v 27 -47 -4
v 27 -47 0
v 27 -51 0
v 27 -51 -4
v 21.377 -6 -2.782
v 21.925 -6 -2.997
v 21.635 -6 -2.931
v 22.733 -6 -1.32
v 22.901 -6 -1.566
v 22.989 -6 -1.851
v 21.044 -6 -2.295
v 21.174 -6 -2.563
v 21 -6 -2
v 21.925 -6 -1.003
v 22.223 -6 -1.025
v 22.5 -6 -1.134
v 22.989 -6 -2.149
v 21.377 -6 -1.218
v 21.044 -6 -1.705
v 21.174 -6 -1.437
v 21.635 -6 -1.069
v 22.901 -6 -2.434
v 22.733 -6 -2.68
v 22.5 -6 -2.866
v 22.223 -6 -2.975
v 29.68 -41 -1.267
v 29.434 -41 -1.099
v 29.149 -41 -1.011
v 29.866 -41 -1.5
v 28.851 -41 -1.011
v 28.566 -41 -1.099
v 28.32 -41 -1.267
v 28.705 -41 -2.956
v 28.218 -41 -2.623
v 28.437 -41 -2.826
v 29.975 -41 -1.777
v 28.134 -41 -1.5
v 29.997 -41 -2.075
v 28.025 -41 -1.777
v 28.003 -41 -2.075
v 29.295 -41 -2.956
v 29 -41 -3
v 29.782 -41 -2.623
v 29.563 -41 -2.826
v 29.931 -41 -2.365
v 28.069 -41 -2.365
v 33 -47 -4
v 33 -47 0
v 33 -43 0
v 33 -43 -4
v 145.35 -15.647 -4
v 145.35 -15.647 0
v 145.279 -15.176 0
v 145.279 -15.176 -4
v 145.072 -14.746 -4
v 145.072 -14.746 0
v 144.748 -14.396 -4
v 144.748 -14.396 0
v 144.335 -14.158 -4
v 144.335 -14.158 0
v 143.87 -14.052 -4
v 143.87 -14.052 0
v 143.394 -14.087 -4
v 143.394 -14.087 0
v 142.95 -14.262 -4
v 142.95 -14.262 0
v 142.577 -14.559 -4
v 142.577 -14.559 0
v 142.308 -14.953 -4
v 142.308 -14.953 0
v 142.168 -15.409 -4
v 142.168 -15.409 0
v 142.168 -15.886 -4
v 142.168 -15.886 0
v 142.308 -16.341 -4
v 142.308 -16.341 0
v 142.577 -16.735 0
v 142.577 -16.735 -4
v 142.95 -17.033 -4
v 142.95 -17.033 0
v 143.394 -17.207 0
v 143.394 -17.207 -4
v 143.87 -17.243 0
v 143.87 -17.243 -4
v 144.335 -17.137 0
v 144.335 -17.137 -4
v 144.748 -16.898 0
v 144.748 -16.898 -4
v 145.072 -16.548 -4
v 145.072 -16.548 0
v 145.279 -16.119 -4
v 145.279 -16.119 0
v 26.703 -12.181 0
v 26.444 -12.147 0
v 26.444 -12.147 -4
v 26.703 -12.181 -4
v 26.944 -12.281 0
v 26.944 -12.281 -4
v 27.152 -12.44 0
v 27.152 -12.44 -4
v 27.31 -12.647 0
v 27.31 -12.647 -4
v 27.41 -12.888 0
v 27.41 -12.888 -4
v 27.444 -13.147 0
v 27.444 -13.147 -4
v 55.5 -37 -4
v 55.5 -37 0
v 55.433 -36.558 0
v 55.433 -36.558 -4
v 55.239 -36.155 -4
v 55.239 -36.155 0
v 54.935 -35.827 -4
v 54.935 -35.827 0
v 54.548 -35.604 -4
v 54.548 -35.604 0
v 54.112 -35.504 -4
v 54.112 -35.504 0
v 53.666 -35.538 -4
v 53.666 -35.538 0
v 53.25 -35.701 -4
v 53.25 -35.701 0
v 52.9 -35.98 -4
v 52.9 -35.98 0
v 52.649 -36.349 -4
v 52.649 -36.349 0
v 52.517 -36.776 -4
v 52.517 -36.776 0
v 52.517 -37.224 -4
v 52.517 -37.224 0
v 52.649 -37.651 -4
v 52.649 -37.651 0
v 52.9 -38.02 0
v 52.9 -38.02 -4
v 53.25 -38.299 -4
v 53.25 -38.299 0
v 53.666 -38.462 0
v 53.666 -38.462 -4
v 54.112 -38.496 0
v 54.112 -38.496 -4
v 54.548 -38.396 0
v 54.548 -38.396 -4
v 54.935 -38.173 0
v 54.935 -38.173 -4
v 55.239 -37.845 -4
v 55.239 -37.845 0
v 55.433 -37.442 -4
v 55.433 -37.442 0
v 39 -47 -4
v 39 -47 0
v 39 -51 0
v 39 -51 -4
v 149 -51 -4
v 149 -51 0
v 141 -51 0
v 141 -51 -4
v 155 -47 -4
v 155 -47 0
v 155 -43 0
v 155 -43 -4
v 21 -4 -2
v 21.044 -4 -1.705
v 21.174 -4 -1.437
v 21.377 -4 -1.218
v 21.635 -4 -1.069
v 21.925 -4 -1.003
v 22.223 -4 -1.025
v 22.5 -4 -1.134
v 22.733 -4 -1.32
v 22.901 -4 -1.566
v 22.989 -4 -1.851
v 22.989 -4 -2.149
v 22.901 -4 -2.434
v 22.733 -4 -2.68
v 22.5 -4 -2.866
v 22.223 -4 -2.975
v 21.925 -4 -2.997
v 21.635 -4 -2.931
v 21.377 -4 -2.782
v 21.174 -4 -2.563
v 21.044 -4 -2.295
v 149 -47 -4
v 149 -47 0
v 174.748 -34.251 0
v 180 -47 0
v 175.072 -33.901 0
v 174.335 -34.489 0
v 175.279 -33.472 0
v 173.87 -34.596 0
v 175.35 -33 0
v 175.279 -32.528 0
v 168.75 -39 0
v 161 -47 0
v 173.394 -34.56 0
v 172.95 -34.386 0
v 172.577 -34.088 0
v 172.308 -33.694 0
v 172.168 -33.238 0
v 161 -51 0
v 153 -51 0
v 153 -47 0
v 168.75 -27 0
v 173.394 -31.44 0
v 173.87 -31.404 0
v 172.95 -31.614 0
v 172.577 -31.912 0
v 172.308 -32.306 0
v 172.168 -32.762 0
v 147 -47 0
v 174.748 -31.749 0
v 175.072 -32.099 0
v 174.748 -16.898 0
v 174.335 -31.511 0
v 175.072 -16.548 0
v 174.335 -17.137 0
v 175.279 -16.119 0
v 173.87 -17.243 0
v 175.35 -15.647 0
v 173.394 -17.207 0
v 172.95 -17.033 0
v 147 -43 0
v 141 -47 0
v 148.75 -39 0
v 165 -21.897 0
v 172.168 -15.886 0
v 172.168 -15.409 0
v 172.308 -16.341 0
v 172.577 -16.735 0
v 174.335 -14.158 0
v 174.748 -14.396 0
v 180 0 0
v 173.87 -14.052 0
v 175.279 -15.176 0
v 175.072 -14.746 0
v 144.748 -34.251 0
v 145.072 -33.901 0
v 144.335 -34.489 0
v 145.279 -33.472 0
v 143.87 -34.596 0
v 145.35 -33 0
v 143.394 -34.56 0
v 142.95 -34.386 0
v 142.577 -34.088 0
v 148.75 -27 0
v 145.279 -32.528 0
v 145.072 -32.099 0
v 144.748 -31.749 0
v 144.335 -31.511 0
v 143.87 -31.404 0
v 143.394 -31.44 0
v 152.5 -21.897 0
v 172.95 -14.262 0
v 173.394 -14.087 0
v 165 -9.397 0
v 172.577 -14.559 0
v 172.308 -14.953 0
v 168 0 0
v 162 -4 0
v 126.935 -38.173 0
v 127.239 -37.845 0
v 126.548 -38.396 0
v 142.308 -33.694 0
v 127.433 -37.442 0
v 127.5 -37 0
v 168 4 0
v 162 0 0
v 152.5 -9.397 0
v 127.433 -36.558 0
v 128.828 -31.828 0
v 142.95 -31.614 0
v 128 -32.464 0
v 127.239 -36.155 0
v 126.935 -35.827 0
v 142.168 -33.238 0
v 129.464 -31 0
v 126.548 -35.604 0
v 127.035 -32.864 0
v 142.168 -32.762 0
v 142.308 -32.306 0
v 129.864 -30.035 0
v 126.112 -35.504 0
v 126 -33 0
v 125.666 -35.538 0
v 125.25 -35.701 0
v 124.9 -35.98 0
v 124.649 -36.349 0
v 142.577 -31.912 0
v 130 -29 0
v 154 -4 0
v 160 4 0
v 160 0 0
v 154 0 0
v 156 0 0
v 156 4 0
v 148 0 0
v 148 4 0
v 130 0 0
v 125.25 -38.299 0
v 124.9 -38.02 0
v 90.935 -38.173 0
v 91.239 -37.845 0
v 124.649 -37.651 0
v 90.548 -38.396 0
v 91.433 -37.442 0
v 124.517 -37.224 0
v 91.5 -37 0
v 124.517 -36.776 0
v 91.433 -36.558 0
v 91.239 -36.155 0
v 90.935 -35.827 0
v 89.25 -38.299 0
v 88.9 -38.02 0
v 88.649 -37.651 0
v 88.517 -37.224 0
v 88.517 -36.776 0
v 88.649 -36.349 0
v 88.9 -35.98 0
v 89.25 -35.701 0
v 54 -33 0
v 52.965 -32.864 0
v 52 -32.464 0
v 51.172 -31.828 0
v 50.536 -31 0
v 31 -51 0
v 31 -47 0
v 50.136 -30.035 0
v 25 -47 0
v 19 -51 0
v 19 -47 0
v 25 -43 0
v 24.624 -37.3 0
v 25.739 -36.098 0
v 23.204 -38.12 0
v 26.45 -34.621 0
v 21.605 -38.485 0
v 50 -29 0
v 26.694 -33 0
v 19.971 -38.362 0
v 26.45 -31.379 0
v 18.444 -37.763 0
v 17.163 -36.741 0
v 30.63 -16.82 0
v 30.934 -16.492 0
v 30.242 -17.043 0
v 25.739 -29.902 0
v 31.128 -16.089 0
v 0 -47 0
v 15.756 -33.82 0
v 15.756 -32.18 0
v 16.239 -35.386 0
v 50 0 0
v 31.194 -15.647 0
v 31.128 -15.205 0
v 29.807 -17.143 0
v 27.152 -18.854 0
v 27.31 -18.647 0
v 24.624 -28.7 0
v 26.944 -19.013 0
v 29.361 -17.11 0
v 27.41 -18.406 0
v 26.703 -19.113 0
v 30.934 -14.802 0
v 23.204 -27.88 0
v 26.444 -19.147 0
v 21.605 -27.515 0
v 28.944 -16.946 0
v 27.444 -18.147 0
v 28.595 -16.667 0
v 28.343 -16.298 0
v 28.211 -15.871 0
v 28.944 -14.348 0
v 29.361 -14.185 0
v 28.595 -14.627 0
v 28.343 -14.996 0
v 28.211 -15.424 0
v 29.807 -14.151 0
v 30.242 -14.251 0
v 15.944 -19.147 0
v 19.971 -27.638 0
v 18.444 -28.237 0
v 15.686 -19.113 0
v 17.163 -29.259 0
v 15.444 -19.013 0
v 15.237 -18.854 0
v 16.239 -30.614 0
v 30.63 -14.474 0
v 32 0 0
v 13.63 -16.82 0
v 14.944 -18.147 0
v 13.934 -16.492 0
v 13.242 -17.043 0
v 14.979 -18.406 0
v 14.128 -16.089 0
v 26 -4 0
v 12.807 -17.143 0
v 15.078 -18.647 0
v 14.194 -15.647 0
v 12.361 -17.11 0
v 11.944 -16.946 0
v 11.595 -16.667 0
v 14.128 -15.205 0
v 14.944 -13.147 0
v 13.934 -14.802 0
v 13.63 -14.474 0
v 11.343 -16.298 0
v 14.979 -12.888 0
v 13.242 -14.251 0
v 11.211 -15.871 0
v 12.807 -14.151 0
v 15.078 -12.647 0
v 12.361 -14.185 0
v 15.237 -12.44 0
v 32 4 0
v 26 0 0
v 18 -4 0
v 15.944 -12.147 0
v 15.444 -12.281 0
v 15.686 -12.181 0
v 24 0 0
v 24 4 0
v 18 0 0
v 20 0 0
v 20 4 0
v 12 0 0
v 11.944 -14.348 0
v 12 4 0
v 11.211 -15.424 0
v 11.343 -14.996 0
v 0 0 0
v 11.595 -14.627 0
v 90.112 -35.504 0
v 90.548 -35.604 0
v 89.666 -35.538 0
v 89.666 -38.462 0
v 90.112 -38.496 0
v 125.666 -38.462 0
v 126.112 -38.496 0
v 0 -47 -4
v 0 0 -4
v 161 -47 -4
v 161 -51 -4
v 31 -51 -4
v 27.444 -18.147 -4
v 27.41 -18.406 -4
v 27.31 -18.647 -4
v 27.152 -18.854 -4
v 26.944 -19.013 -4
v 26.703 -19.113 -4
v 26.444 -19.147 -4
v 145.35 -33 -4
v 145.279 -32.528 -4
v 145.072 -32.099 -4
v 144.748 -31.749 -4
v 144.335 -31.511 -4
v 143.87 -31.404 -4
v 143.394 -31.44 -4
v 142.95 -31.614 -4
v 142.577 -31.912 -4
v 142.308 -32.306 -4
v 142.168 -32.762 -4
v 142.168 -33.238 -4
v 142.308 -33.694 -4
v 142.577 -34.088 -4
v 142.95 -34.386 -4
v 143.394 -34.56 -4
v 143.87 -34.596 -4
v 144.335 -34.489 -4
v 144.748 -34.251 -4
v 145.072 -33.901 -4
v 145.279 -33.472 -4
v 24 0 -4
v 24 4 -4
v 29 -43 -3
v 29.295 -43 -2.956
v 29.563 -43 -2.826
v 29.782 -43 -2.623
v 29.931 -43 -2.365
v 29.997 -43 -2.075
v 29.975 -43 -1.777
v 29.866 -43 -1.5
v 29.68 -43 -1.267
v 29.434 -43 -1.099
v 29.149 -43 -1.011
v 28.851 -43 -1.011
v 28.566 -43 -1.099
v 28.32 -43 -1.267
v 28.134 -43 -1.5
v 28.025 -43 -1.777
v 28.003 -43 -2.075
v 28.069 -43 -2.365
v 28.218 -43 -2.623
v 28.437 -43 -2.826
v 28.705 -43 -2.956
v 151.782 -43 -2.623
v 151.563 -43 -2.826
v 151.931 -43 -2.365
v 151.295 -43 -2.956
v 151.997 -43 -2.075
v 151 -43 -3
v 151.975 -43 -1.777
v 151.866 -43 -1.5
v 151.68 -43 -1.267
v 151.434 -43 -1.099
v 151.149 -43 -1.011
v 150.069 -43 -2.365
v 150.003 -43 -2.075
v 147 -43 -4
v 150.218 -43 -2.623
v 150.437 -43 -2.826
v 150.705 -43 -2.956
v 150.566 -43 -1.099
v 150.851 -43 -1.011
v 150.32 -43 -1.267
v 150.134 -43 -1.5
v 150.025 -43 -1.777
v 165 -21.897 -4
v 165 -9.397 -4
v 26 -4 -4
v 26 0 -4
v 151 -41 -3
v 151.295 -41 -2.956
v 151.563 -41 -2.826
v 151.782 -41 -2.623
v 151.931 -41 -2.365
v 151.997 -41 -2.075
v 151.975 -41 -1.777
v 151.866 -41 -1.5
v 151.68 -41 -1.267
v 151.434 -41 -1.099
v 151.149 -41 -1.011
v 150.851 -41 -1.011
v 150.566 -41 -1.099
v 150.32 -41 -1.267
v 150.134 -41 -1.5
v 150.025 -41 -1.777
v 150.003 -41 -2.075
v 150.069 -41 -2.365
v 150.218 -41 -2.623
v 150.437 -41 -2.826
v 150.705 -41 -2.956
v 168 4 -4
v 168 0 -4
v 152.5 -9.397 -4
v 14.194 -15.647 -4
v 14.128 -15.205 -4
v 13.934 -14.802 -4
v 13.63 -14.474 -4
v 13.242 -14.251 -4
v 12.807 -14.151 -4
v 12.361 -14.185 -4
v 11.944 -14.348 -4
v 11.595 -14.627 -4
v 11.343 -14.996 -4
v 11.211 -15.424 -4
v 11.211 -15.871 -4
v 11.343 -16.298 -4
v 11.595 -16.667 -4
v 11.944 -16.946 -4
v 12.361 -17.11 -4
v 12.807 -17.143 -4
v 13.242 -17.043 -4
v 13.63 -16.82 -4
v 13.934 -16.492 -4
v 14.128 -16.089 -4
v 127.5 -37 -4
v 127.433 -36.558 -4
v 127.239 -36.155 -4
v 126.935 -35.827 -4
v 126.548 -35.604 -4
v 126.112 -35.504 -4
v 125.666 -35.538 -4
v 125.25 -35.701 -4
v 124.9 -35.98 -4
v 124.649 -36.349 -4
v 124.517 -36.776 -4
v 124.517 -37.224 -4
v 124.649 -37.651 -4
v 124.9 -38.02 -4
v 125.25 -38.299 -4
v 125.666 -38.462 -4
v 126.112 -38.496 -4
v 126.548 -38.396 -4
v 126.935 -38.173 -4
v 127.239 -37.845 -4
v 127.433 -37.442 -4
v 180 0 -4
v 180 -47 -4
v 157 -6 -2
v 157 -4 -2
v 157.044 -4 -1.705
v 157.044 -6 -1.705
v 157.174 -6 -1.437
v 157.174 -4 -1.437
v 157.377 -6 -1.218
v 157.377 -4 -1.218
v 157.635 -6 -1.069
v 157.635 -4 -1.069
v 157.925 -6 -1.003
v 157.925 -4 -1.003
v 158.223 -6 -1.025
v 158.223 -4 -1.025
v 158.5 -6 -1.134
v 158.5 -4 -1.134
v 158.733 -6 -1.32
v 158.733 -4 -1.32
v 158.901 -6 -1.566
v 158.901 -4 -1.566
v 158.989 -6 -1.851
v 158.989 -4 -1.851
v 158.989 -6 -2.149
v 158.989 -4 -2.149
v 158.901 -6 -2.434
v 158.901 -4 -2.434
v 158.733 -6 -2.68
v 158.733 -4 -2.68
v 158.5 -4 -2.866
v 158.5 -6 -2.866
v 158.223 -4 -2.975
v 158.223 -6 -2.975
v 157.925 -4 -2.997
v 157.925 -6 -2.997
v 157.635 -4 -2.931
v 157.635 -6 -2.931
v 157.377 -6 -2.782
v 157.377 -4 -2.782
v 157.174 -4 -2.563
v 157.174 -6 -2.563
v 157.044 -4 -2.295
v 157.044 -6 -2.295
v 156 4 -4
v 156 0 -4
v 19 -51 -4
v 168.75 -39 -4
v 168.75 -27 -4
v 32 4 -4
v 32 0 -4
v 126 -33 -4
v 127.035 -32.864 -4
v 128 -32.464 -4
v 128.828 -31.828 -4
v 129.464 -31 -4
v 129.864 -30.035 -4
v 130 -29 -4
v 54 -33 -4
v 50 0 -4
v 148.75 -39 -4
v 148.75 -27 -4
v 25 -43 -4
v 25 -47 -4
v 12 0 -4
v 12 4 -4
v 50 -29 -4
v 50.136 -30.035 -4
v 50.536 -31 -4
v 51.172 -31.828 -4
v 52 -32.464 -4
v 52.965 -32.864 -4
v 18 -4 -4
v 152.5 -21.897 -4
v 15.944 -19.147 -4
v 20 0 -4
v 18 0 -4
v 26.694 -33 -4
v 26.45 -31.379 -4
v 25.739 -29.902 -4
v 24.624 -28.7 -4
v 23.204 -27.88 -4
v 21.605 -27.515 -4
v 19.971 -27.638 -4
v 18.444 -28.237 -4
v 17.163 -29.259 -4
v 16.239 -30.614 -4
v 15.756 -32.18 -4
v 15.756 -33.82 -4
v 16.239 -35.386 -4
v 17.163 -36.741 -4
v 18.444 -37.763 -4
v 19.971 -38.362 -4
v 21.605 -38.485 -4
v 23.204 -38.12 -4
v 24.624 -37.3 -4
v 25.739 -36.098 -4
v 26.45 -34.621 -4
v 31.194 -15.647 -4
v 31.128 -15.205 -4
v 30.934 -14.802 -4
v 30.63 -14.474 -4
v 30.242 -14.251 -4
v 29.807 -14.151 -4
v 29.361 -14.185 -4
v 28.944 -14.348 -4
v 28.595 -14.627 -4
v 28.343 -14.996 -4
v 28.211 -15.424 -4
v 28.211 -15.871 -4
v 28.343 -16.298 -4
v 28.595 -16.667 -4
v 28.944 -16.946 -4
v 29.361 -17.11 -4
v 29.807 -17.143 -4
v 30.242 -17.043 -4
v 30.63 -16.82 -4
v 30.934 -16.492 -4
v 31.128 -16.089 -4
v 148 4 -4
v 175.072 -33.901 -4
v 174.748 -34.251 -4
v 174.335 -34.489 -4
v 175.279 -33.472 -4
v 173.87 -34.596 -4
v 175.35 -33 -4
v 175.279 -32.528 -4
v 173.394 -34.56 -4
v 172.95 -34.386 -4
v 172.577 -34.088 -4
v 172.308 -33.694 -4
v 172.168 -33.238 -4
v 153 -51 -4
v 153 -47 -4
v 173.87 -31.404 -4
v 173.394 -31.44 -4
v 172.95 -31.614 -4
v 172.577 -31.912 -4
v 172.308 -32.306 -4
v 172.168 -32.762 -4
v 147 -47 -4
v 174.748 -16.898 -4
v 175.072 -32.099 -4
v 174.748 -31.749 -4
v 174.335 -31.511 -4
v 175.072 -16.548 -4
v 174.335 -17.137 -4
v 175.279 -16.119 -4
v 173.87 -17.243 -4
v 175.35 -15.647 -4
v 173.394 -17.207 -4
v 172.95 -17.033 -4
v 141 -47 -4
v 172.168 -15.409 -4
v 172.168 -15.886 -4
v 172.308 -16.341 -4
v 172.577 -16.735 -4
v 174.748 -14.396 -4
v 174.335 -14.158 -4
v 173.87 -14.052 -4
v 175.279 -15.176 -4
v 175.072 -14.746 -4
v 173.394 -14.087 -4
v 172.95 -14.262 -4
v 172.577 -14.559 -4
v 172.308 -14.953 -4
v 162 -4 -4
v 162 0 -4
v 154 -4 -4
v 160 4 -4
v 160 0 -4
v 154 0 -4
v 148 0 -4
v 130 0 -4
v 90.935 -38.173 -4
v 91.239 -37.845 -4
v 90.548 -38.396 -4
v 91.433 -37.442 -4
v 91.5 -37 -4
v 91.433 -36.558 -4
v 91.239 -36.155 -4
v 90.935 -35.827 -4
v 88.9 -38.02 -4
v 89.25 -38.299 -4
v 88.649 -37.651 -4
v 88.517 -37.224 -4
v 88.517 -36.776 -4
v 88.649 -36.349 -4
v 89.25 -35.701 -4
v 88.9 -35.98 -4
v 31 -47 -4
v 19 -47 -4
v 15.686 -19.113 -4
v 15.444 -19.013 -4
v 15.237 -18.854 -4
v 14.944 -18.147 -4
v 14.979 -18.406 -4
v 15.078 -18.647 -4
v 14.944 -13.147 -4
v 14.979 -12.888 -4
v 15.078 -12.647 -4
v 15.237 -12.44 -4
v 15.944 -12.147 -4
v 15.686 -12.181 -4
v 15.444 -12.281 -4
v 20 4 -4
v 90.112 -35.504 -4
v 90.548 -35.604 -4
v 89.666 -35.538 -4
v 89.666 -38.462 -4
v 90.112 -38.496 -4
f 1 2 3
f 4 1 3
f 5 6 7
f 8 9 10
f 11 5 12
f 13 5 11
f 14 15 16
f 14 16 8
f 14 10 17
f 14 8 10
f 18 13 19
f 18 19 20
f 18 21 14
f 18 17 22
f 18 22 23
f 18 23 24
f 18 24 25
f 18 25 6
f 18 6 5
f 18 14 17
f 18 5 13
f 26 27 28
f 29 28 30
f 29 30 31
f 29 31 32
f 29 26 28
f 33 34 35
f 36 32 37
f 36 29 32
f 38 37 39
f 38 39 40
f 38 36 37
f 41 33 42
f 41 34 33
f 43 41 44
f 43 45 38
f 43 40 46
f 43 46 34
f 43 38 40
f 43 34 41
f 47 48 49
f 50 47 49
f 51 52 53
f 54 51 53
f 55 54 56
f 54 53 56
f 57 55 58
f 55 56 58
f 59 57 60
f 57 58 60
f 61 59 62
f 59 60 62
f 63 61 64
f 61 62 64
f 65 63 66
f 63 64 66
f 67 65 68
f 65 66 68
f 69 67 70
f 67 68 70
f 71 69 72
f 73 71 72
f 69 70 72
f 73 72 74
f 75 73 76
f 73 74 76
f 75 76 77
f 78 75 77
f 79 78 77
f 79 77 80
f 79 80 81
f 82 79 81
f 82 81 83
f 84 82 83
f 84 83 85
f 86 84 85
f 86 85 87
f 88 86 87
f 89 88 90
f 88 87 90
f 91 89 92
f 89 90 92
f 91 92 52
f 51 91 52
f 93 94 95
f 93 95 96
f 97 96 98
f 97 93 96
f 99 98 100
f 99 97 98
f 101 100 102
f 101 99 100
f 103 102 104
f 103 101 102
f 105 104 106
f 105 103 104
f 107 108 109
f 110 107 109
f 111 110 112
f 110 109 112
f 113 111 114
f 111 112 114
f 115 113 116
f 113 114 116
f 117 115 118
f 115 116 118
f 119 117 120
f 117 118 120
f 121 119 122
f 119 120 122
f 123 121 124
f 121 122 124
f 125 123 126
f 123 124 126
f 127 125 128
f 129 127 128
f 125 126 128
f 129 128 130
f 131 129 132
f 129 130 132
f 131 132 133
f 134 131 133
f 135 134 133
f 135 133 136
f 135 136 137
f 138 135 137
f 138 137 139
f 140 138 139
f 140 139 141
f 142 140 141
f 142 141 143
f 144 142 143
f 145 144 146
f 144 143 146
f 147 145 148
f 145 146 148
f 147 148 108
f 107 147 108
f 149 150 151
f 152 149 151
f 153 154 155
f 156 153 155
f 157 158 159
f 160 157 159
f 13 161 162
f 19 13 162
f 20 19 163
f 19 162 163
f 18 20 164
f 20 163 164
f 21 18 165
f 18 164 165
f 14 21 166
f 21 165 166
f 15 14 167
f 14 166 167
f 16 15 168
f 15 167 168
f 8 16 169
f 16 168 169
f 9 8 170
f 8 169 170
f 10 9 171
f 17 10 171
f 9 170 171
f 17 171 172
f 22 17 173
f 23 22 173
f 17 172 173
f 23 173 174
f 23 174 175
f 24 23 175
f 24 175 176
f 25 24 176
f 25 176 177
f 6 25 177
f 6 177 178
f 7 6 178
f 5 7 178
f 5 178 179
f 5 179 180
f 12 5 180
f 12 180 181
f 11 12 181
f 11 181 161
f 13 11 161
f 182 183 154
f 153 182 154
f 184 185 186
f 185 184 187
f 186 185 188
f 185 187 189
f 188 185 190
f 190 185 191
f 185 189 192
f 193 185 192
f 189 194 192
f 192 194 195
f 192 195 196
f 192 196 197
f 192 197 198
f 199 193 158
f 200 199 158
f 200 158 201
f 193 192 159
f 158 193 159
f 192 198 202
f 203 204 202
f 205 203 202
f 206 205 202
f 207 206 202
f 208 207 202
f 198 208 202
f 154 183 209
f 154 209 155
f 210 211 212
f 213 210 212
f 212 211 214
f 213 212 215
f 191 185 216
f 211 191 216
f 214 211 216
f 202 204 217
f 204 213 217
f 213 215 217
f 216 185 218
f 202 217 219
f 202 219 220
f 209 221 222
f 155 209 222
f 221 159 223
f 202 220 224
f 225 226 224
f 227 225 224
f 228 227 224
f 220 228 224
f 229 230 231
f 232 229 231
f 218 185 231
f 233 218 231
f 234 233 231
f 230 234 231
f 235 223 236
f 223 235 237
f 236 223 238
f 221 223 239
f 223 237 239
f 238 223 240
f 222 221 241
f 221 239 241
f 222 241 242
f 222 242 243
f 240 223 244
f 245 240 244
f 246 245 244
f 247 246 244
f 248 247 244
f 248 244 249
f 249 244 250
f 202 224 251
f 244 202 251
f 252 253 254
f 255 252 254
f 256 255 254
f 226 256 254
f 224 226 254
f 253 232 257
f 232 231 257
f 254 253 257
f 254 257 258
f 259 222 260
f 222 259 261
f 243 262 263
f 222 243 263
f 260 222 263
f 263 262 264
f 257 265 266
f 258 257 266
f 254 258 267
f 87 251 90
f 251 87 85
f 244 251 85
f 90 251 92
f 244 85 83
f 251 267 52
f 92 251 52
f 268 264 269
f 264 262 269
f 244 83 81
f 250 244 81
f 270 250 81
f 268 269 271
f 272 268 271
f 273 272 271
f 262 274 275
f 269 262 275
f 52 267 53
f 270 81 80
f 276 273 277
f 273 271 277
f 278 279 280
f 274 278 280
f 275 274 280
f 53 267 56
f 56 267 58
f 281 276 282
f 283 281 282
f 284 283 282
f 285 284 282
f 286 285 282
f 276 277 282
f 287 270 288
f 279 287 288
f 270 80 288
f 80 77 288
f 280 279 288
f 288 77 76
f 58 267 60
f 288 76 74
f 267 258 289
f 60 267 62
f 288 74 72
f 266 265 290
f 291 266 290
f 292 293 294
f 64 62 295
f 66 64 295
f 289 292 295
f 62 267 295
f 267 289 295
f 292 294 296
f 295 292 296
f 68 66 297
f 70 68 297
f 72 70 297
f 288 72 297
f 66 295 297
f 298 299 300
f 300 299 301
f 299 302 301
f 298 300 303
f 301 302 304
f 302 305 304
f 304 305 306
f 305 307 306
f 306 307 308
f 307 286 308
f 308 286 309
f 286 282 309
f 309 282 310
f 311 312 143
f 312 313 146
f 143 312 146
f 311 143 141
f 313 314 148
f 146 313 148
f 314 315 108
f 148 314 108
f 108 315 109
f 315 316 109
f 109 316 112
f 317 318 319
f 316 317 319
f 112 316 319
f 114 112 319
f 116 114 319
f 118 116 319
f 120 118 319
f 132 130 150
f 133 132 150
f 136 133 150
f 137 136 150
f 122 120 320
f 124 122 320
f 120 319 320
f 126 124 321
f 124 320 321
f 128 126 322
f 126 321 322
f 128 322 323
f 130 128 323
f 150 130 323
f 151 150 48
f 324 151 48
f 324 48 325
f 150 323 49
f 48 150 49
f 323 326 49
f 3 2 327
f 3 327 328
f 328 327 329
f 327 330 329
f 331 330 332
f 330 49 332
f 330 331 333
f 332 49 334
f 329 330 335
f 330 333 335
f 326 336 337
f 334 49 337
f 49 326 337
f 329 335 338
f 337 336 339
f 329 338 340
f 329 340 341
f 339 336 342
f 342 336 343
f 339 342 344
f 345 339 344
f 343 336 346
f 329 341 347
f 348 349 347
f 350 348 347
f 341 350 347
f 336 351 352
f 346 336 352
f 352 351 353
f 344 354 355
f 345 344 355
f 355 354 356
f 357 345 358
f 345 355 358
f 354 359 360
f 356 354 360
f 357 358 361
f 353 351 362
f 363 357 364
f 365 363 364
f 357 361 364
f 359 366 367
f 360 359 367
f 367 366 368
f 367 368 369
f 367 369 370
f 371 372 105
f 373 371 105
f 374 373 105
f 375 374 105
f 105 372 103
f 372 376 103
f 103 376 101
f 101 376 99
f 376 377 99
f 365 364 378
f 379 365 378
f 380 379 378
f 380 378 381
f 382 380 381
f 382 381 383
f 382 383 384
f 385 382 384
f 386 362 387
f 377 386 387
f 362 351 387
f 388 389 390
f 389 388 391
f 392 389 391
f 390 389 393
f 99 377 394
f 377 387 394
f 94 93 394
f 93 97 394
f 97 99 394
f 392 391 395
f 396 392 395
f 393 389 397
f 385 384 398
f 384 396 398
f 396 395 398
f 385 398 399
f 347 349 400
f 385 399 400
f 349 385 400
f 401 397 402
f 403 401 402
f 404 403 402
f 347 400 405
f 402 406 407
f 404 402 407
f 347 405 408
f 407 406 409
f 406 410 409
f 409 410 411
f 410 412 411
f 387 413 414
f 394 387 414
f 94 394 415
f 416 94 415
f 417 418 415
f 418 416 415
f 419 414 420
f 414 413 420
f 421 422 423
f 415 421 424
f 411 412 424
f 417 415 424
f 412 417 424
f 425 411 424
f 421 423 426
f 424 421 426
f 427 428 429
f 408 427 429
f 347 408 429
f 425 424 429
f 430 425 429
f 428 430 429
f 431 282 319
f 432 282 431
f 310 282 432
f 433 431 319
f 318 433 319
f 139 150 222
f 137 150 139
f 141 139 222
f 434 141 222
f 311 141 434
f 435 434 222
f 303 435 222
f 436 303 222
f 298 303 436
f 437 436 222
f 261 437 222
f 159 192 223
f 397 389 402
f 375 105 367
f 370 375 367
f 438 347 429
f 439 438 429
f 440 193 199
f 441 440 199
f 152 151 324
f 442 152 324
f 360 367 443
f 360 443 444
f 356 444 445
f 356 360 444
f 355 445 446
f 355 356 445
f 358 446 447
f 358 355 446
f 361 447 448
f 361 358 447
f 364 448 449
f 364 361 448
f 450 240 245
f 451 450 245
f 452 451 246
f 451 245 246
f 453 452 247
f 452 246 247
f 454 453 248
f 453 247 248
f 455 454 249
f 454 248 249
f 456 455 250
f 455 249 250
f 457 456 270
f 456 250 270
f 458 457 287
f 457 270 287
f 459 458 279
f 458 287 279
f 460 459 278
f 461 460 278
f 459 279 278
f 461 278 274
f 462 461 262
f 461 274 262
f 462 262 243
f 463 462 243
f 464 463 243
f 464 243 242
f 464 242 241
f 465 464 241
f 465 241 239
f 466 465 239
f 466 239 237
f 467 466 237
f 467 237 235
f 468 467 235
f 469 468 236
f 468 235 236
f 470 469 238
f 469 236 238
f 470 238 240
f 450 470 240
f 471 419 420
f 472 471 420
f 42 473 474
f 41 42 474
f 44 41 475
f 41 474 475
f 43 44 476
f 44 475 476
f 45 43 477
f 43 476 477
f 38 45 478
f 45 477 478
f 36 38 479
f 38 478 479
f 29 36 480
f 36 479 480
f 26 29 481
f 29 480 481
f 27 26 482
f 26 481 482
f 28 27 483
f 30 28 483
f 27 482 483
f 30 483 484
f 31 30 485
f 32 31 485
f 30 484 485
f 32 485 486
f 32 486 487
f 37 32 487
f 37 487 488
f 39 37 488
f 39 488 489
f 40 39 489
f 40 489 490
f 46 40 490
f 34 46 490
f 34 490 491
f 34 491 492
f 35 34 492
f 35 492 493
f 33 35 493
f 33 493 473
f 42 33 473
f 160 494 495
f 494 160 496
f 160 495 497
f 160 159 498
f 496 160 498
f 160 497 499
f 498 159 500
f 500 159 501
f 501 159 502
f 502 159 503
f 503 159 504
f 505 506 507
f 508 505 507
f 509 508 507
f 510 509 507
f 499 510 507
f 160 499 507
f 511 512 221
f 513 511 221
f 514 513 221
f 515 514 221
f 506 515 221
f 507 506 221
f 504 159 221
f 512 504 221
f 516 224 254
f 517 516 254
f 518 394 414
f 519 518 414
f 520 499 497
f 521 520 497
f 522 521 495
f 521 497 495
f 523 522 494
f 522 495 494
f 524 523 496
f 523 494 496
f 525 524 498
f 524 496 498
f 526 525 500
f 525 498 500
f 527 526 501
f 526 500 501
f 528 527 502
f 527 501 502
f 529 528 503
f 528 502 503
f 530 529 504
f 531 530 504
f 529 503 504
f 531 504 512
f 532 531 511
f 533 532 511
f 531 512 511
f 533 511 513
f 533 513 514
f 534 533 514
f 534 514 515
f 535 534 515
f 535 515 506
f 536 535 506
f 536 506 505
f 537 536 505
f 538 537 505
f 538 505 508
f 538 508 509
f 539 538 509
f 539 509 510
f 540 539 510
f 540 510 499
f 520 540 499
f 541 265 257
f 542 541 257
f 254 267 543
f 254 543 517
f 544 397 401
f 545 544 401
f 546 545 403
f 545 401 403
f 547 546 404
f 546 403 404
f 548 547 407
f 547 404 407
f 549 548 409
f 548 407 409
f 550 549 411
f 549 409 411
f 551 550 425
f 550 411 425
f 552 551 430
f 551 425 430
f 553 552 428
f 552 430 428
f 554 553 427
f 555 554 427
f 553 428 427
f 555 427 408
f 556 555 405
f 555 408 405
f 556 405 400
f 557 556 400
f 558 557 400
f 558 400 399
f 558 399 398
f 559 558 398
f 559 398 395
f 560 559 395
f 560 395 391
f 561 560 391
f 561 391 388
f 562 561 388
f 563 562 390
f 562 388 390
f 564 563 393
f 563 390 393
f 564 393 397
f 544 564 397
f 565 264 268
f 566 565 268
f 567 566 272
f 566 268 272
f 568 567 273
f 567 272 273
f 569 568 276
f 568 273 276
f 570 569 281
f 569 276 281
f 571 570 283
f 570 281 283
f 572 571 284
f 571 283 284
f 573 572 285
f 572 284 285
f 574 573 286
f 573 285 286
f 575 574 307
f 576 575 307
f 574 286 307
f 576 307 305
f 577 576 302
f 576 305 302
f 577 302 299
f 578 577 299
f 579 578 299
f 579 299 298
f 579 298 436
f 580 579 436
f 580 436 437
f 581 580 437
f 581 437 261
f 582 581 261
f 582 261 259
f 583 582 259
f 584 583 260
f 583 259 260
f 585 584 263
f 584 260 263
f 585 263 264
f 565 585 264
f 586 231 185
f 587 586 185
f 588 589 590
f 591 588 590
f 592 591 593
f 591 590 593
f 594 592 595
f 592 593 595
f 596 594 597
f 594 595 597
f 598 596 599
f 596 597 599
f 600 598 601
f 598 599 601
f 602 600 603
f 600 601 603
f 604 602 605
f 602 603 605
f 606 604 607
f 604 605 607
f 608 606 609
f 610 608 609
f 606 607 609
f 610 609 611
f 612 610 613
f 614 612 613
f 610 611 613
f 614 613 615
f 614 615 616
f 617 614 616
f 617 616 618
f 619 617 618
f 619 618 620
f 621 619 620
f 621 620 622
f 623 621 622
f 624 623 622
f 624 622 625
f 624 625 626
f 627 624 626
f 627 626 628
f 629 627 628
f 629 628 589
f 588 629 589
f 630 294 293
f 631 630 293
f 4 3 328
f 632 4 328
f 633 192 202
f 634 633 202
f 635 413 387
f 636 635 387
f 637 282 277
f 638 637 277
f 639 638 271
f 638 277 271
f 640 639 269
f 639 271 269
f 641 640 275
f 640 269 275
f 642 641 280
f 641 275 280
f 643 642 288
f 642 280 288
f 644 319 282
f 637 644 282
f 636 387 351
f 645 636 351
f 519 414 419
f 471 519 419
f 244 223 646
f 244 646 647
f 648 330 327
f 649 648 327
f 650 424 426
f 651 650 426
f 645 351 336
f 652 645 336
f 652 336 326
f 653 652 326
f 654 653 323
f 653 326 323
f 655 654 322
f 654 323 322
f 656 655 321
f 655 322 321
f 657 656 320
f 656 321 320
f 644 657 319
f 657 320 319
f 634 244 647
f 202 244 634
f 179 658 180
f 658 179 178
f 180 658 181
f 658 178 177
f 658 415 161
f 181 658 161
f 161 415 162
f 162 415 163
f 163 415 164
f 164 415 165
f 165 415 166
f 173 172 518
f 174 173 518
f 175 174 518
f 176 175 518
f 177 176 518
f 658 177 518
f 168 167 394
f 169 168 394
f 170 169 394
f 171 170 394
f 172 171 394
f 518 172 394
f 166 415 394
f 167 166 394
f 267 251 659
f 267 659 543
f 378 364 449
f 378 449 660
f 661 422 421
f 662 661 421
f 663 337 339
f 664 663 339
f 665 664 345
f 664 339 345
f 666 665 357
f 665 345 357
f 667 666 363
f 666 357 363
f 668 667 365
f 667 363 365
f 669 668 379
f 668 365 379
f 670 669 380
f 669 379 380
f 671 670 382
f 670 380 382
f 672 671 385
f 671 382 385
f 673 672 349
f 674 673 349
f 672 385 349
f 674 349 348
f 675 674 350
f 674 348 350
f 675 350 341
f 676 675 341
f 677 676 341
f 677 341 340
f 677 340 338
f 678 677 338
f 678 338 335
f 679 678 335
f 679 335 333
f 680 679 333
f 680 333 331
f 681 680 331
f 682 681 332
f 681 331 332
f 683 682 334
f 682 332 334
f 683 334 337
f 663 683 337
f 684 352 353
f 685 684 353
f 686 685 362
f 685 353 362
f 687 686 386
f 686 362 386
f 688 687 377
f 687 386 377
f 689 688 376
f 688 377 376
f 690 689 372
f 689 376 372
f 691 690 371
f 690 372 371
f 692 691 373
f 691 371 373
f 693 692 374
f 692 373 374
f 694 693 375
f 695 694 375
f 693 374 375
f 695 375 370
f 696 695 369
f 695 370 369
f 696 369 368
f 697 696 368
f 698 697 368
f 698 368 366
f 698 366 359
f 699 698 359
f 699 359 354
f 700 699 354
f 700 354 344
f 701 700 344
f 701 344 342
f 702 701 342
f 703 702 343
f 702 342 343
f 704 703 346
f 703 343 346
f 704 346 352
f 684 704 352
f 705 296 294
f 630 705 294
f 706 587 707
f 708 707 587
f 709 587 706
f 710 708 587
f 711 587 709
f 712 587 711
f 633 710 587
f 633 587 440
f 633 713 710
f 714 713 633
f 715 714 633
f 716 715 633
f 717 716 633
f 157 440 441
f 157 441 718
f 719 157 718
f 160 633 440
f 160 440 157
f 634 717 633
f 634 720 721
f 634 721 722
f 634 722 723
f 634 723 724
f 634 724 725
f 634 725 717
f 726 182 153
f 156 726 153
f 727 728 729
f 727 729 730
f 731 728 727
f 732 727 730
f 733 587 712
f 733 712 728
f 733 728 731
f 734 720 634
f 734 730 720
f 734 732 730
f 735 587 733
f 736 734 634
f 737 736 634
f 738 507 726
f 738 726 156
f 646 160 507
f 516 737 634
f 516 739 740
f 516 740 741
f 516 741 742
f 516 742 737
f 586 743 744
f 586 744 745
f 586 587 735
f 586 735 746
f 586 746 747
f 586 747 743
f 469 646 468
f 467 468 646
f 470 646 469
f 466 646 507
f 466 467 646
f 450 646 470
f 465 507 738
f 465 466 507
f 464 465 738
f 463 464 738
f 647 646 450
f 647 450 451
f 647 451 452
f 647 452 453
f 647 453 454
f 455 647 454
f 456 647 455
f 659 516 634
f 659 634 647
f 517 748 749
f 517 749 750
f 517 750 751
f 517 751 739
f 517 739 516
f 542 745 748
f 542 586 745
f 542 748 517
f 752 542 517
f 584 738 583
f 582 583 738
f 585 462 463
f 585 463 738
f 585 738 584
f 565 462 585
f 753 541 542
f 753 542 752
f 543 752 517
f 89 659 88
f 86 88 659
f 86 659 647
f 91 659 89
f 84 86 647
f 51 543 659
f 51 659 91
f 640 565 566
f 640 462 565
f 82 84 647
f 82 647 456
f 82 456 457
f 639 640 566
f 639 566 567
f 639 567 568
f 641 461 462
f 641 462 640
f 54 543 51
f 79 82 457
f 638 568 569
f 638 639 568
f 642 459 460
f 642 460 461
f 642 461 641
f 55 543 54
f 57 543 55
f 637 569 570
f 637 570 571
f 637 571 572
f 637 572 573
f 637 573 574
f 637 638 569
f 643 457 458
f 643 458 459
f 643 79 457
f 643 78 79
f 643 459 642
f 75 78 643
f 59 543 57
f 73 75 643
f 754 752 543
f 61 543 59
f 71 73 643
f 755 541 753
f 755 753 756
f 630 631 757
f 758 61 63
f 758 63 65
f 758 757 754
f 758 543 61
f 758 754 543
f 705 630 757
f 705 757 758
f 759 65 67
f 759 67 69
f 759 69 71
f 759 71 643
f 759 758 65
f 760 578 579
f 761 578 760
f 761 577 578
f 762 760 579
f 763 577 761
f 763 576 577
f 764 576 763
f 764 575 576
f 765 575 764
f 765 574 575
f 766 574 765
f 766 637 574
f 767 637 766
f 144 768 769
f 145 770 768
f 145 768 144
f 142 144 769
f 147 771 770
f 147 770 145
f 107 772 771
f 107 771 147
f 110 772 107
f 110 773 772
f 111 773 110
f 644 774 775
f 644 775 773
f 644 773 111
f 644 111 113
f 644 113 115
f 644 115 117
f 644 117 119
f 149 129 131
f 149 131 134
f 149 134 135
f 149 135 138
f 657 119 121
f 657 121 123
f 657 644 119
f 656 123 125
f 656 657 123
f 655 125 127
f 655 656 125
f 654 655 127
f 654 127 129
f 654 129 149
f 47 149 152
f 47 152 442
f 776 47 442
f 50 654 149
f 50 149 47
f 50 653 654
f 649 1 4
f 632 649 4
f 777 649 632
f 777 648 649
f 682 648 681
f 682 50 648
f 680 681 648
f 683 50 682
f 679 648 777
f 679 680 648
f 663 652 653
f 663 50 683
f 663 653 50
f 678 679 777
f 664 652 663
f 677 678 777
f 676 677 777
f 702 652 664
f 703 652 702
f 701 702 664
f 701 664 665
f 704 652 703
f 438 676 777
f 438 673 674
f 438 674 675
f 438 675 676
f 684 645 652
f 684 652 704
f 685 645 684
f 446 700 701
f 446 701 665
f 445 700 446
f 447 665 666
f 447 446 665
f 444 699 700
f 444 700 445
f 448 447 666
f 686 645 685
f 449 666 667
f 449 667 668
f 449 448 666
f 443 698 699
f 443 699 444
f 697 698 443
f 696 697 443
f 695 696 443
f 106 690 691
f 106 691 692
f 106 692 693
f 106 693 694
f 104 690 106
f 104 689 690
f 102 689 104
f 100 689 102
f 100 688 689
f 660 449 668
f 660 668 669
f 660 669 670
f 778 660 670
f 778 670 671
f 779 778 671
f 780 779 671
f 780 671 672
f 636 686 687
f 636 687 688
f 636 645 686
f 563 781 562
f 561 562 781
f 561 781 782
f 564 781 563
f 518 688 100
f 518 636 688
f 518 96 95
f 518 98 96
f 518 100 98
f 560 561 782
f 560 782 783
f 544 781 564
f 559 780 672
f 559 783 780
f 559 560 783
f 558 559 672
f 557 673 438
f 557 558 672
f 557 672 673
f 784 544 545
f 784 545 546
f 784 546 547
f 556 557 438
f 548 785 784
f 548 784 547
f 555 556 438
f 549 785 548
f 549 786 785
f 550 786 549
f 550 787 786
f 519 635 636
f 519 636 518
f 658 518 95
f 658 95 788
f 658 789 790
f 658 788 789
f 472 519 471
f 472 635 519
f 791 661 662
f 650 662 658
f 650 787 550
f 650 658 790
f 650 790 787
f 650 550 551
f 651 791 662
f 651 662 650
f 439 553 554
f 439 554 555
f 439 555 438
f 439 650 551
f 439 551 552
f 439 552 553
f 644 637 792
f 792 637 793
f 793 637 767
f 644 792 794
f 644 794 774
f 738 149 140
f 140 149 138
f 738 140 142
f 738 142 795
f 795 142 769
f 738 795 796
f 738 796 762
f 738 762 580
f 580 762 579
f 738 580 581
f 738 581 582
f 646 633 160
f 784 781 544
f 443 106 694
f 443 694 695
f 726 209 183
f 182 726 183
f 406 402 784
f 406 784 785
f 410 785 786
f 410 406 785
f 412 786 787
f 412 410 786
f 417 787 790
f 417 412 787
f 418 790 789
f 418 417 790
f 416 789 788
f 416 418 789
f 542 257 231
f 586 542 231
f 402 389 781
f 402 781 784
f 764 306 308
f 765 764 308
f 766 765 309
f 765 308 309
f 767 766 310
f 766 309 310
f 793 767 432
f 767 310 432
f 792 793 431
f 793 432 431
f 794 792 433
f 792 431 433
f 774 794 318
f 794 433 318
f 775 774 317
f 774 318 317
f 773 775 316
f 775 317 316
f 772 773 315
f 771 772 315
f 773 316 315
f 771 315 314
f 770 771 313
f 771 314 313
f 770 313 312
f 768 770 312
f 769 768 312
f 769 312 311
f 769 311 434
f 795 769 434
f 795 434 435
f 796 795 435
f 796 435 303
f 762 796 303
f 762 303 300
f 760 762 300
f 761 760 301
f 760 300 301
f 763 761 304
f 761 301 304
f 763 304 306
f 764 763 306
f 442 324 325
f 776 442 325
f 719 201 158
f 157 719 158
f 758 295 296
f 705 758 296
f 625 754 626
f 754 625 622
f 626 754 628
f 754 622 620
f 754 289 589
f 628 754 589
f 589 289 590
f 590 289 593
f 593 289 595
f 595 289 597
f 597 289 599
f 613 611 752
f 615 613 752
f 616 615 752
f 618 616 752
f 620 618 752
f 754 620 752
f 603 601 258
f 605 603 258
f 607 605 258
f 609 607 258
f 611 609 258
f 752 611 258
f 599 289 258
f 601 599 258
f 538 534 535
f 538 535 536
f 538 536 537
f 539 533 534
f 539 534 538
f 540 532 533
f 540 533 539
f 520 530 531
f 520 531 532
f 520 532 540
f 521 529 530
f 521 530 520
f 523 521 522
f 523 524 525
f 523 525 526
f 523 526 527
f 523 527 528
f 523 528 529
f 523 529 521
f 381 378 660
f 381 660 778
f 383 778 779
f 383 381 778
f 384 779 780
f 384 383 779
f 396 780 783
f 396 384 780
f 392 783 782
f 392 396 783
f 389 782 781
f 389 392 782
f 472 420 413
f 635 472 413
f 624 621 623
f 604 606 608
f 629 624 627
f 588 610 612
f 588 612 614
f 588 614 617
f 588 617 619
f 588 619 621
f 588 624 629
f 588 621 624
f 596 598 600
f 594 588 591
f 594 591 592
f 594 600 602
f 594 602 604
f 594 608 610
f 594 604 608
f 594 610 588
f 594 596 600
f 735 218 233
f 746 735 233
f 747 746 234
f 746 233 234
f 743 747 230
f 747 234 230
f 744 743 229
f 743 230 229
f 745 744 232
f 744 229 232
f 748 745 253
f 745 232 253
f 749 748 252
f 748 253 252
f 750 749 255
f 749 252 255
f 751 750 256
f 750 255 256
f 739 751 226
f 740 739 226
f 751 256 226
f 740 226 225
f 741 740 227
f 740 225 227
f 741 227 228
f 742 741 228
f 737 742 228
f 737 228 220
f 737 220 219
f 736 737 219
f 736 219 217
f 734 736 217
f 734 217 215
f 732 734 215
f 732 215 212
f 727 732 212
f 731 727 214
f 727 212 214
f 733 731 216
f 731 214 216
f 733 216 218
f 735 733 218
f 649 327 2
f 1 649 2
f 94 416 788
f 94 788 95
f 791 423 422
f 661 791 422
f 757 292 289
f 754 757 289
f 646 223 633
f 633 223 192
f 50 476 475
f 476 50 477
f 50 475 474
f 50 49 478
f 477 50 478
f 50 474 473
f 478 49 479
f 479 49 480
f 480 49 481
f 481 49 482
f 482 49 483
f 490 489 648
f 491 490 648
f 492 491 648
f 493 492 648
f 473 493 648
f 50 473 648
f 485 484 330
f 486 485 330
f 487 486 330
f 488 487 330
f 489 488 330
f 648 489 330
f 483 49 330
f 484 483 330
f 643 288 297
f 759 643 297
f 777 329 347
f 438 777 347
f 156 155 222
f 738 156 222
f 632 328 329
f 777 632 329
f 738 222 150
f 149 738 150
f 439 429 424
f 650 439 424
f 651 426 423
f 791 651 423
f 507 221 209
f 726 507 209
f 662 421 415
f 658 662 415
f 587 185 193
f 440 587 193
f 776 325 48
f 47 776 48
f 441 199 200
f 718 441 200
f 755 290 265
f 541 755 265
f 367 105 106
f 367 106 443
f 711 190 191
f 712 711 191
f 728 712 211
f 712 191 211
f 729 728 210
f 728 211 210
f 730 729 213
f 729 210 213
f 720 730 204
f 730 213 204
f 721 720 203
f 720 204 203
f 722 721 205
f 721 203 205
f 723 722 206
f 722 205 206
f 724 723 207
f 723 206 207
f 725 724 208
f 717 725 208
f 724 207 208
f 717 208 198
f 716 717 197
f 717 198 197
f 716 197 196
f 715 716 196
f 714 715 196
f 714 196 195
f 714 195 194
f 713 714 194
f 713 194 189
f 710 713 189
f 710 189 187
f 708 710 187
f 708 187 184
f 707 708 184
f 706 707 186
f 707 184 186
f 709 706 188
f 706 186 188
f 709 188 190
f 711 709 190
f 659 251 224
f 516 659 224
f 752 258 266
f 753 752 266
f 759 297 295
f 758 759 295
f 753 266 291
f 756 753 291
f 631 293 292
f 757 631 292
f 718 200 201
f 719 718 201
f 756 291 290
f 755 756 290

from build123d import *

# Parameters (mm, degrees)
SKETCH_1_R             = 1.6
SKETCH_1_R_2           = 5.5
SKETCH_1_R_3           = 1.5
SKETCH_1_W             = 12.5
SKETCH_1_H             = 12.5
SKETCH_1_W_2           = 20
SKETCH_1_H_2           = 12
SM_BASE_FLANGE_1_DEPTH = 4
SKETCH_6_R             = 1
CUT_EXTRUDE_1_DEPTH    = 10
SKETCH_7_R             = 1
CUT_EXTRUDE_2_DEPTH    = 10


# Sheet-metal steps are written as plain solids
with BuildPart() as part:
    # Sketch 1 → Базовая кромка1 (new body)
    with BuildSketch(Plane.XY):
        with BuildLine():
            Line((0, 0), (12, 0))
            Line((12, 0), (12, 4))
            Line((12, 4), (20, 4))
            Line((20, 4), (20, 0))
            Line((20, 0), (18, 0))
            Line((18, 0), (18, -4))
            Line((18, -4), (26, -4))
            Line((26, -4), (26, 0))
            Line((26, 0), (24, 0))
            Line((24, 0), (24, 4))
            Line((24, 4), (32, 4))
            Line((32, 4), (32, 0))
            Line((32, 0), (50, 0))
            Line((50, 0), (50, -29))
            ThreePointArc((50, -29), (51.171572875, -31.828427125), (54, -33))
            Line((54, -33), (126, -33))
            ThreePointArc((126, -33), (128.828427125, -31.828427125), (130, -29))
            Line((130, -29), (130, 0))
            Line((130, 0), (148, 0))
            Line((148, 0), (148, 4))
            Line((148, 4), (156, 4))
            Line((156, 4), (156, 0))
            Line((156, 0), (154, 0))
            Line((154, 0), (154, -4))
            Line((154, -4), (162, -4))
            Line((162, -4), (162, 0))
            Line((162, 0), (160, 0))
            Line((160, 0), (160, 4))
            Line((160, 4), (168, 4))
            Line((168, 4), (168, 0))
            Line((168, 0), (180, 0))
            Line((180, 0), (180, -47))
            Line((180, -47), (161, -47))
            Line((161, -47), (161, -51))
            Line((161, -51), (153, -51))
            Line((153, -51), (153, -47))
            Line((153, -47), (155, -47))
            Line((155, -47), (155, -43))
            Line((155, -43), (147, -43))
            Line((147, -43), (147, -47))
            Line((147, -47), (149, -47))
            Line((149, -47), (149, -51))
            Line((149, -51), (141, -51))
            Line((141, -51), (141, -47))
            Line((141, -47), (90, -47))
            Line((90, -47), (39, -47))
            Line((39, -47), (39, -51))
            Line((39, -51), (31, -51))
            Line((31, -51), (31, -47))
            Line((31, -47), (33, -47))
            Line((33, -47), (33, -43))
            Line((33, -43), (25, -43))
            Line((25, -43), (25, -47))
            Line((25, -47), (27, -47))
            Line((27, -47), (27, -51))
            Line((27, -51), (19, -51))
            Line((19, -51), (19, -47))
            Line((19, -47), (0, -47))
            Line((0, -47), (0, 0))
        make_face()
        with Locations((143.75, -15.647183543)):
            Circle(SKETCH_1_R, mode=Mode.SUBTRACT)
        with Locations((173.75, -15.647183543)):
            Circle(SKETCH_1_R, mode=Mode.SUBTRACT)
        with Locations((143.75, -33)):
            Circle(SKETCH_1_R, mode=Mode.SUBTRACT)
        with Locations((173.75, -33)):
            Circle(SKETCH_1_R, mode=Mode.SUBTRACT)
        with Locations((21.194446521, -33)):
            Circle(SKETCH_1_R_2, mode=Mode.SUBTRACT)
        with Locations((90, -37)):
            Circle(SKETCH_1_R_3, mode=Mode.SUBTRACT)
        with Locations((54, -37)):
            Circle(SKETCH_1_R_3, mode=Mode.SUBTRACT)
        with Locations((126, -37)):
            Circle(SKETCH_1_R_3, mode=Mode.SUBTRACT)
        with Locations((12.694446521, -15.647183543)):
            Circle(SKETCH_1_R_3, mode=Mode.SUBTRACT)
        with Locations((29.694446521, -15.647183543)):
            Circle(SKETCH_1_R_3, mode=Mode.SUBTRACT)
        with Locations((158.75, -15.647183543)):
            Rectangle(SKETCH_1_W, SKETCH_1_H, mode=Mode.SUBTRACT)
        with Locations((158.75, -33)):
            Rectangle(SKETCH_1_W_2, SKETCH_1_H_2, mode=Mode.SUBTRACT)
        with BuildLine():
            Line((15.944446521, -12.147183543), (26.444446521, -12.147183543))
            ThreePointArc((26.444446521, -12.147183543), (27.151553303, -12.440076762), (27.444446521, -13.147183543))
            Line((27.444446521, -13.147183543), (27.444446521, -18.147183543))
            ThreePointArc((27.444446521, -18.147183543), (27.151553303, -18.854290324), (26.444446521, -19.147183543))
            Line((26.444446521, -19.147183543), (15.944446521, -19.147183543))
            ThreePointArc((15.944446521, -19.147183543), (15.23733974, -18.854290324), (14.944446521, -18.147183543))
            Line((14.944446521, -18.147183543), (14.944446521, -13.147183543))
            ThreePointArc((14.944446521, -13.147183543), (15.23733974, -12.440076762), (15.944446521, -12.147183543))
        make_face(mode=Mode.SUBTRACT)
    extrude(amount=-SM_BASE_FLANGE_1_DEPTH)

    # Эскиз6 → Вырез-Вытянуть1 (cut)
    with BuildSketch(Plane(origin=(0, 4, 0), x_dir=(1, 0, 0), z_dir=(0, 1, 0))):
        with Locations(Location((22, 2, 0), (0, 0, 180))):
            Circle(SKETCH_6_R)
        with Locations(Location((158, 2, 0), (0, 0, 180))):
            Circle(SKETCH_6_R)
    extrude(amount=-CUT_EXTRUDE_1_DEPTH, mode=Mode.SUBTRACT)

    # Эскиз7 → Вырез-Вытянуть2 (cut)
    with BuildSketch(Plane.XZ.offset(51)):
        with Locations(Location((29, -2, 0), (0, 0, 270))):
            Circle(SKETCH_7_R)
        with Locations(Location((151, -2, 0), (0, 0, 270))):
            Circle(SKETCH_7_R)
    extrude(amount=-CUT_EXTRUDE_2_DEPTH, mode=Mode.SUBTRACT)


solid = part.part
